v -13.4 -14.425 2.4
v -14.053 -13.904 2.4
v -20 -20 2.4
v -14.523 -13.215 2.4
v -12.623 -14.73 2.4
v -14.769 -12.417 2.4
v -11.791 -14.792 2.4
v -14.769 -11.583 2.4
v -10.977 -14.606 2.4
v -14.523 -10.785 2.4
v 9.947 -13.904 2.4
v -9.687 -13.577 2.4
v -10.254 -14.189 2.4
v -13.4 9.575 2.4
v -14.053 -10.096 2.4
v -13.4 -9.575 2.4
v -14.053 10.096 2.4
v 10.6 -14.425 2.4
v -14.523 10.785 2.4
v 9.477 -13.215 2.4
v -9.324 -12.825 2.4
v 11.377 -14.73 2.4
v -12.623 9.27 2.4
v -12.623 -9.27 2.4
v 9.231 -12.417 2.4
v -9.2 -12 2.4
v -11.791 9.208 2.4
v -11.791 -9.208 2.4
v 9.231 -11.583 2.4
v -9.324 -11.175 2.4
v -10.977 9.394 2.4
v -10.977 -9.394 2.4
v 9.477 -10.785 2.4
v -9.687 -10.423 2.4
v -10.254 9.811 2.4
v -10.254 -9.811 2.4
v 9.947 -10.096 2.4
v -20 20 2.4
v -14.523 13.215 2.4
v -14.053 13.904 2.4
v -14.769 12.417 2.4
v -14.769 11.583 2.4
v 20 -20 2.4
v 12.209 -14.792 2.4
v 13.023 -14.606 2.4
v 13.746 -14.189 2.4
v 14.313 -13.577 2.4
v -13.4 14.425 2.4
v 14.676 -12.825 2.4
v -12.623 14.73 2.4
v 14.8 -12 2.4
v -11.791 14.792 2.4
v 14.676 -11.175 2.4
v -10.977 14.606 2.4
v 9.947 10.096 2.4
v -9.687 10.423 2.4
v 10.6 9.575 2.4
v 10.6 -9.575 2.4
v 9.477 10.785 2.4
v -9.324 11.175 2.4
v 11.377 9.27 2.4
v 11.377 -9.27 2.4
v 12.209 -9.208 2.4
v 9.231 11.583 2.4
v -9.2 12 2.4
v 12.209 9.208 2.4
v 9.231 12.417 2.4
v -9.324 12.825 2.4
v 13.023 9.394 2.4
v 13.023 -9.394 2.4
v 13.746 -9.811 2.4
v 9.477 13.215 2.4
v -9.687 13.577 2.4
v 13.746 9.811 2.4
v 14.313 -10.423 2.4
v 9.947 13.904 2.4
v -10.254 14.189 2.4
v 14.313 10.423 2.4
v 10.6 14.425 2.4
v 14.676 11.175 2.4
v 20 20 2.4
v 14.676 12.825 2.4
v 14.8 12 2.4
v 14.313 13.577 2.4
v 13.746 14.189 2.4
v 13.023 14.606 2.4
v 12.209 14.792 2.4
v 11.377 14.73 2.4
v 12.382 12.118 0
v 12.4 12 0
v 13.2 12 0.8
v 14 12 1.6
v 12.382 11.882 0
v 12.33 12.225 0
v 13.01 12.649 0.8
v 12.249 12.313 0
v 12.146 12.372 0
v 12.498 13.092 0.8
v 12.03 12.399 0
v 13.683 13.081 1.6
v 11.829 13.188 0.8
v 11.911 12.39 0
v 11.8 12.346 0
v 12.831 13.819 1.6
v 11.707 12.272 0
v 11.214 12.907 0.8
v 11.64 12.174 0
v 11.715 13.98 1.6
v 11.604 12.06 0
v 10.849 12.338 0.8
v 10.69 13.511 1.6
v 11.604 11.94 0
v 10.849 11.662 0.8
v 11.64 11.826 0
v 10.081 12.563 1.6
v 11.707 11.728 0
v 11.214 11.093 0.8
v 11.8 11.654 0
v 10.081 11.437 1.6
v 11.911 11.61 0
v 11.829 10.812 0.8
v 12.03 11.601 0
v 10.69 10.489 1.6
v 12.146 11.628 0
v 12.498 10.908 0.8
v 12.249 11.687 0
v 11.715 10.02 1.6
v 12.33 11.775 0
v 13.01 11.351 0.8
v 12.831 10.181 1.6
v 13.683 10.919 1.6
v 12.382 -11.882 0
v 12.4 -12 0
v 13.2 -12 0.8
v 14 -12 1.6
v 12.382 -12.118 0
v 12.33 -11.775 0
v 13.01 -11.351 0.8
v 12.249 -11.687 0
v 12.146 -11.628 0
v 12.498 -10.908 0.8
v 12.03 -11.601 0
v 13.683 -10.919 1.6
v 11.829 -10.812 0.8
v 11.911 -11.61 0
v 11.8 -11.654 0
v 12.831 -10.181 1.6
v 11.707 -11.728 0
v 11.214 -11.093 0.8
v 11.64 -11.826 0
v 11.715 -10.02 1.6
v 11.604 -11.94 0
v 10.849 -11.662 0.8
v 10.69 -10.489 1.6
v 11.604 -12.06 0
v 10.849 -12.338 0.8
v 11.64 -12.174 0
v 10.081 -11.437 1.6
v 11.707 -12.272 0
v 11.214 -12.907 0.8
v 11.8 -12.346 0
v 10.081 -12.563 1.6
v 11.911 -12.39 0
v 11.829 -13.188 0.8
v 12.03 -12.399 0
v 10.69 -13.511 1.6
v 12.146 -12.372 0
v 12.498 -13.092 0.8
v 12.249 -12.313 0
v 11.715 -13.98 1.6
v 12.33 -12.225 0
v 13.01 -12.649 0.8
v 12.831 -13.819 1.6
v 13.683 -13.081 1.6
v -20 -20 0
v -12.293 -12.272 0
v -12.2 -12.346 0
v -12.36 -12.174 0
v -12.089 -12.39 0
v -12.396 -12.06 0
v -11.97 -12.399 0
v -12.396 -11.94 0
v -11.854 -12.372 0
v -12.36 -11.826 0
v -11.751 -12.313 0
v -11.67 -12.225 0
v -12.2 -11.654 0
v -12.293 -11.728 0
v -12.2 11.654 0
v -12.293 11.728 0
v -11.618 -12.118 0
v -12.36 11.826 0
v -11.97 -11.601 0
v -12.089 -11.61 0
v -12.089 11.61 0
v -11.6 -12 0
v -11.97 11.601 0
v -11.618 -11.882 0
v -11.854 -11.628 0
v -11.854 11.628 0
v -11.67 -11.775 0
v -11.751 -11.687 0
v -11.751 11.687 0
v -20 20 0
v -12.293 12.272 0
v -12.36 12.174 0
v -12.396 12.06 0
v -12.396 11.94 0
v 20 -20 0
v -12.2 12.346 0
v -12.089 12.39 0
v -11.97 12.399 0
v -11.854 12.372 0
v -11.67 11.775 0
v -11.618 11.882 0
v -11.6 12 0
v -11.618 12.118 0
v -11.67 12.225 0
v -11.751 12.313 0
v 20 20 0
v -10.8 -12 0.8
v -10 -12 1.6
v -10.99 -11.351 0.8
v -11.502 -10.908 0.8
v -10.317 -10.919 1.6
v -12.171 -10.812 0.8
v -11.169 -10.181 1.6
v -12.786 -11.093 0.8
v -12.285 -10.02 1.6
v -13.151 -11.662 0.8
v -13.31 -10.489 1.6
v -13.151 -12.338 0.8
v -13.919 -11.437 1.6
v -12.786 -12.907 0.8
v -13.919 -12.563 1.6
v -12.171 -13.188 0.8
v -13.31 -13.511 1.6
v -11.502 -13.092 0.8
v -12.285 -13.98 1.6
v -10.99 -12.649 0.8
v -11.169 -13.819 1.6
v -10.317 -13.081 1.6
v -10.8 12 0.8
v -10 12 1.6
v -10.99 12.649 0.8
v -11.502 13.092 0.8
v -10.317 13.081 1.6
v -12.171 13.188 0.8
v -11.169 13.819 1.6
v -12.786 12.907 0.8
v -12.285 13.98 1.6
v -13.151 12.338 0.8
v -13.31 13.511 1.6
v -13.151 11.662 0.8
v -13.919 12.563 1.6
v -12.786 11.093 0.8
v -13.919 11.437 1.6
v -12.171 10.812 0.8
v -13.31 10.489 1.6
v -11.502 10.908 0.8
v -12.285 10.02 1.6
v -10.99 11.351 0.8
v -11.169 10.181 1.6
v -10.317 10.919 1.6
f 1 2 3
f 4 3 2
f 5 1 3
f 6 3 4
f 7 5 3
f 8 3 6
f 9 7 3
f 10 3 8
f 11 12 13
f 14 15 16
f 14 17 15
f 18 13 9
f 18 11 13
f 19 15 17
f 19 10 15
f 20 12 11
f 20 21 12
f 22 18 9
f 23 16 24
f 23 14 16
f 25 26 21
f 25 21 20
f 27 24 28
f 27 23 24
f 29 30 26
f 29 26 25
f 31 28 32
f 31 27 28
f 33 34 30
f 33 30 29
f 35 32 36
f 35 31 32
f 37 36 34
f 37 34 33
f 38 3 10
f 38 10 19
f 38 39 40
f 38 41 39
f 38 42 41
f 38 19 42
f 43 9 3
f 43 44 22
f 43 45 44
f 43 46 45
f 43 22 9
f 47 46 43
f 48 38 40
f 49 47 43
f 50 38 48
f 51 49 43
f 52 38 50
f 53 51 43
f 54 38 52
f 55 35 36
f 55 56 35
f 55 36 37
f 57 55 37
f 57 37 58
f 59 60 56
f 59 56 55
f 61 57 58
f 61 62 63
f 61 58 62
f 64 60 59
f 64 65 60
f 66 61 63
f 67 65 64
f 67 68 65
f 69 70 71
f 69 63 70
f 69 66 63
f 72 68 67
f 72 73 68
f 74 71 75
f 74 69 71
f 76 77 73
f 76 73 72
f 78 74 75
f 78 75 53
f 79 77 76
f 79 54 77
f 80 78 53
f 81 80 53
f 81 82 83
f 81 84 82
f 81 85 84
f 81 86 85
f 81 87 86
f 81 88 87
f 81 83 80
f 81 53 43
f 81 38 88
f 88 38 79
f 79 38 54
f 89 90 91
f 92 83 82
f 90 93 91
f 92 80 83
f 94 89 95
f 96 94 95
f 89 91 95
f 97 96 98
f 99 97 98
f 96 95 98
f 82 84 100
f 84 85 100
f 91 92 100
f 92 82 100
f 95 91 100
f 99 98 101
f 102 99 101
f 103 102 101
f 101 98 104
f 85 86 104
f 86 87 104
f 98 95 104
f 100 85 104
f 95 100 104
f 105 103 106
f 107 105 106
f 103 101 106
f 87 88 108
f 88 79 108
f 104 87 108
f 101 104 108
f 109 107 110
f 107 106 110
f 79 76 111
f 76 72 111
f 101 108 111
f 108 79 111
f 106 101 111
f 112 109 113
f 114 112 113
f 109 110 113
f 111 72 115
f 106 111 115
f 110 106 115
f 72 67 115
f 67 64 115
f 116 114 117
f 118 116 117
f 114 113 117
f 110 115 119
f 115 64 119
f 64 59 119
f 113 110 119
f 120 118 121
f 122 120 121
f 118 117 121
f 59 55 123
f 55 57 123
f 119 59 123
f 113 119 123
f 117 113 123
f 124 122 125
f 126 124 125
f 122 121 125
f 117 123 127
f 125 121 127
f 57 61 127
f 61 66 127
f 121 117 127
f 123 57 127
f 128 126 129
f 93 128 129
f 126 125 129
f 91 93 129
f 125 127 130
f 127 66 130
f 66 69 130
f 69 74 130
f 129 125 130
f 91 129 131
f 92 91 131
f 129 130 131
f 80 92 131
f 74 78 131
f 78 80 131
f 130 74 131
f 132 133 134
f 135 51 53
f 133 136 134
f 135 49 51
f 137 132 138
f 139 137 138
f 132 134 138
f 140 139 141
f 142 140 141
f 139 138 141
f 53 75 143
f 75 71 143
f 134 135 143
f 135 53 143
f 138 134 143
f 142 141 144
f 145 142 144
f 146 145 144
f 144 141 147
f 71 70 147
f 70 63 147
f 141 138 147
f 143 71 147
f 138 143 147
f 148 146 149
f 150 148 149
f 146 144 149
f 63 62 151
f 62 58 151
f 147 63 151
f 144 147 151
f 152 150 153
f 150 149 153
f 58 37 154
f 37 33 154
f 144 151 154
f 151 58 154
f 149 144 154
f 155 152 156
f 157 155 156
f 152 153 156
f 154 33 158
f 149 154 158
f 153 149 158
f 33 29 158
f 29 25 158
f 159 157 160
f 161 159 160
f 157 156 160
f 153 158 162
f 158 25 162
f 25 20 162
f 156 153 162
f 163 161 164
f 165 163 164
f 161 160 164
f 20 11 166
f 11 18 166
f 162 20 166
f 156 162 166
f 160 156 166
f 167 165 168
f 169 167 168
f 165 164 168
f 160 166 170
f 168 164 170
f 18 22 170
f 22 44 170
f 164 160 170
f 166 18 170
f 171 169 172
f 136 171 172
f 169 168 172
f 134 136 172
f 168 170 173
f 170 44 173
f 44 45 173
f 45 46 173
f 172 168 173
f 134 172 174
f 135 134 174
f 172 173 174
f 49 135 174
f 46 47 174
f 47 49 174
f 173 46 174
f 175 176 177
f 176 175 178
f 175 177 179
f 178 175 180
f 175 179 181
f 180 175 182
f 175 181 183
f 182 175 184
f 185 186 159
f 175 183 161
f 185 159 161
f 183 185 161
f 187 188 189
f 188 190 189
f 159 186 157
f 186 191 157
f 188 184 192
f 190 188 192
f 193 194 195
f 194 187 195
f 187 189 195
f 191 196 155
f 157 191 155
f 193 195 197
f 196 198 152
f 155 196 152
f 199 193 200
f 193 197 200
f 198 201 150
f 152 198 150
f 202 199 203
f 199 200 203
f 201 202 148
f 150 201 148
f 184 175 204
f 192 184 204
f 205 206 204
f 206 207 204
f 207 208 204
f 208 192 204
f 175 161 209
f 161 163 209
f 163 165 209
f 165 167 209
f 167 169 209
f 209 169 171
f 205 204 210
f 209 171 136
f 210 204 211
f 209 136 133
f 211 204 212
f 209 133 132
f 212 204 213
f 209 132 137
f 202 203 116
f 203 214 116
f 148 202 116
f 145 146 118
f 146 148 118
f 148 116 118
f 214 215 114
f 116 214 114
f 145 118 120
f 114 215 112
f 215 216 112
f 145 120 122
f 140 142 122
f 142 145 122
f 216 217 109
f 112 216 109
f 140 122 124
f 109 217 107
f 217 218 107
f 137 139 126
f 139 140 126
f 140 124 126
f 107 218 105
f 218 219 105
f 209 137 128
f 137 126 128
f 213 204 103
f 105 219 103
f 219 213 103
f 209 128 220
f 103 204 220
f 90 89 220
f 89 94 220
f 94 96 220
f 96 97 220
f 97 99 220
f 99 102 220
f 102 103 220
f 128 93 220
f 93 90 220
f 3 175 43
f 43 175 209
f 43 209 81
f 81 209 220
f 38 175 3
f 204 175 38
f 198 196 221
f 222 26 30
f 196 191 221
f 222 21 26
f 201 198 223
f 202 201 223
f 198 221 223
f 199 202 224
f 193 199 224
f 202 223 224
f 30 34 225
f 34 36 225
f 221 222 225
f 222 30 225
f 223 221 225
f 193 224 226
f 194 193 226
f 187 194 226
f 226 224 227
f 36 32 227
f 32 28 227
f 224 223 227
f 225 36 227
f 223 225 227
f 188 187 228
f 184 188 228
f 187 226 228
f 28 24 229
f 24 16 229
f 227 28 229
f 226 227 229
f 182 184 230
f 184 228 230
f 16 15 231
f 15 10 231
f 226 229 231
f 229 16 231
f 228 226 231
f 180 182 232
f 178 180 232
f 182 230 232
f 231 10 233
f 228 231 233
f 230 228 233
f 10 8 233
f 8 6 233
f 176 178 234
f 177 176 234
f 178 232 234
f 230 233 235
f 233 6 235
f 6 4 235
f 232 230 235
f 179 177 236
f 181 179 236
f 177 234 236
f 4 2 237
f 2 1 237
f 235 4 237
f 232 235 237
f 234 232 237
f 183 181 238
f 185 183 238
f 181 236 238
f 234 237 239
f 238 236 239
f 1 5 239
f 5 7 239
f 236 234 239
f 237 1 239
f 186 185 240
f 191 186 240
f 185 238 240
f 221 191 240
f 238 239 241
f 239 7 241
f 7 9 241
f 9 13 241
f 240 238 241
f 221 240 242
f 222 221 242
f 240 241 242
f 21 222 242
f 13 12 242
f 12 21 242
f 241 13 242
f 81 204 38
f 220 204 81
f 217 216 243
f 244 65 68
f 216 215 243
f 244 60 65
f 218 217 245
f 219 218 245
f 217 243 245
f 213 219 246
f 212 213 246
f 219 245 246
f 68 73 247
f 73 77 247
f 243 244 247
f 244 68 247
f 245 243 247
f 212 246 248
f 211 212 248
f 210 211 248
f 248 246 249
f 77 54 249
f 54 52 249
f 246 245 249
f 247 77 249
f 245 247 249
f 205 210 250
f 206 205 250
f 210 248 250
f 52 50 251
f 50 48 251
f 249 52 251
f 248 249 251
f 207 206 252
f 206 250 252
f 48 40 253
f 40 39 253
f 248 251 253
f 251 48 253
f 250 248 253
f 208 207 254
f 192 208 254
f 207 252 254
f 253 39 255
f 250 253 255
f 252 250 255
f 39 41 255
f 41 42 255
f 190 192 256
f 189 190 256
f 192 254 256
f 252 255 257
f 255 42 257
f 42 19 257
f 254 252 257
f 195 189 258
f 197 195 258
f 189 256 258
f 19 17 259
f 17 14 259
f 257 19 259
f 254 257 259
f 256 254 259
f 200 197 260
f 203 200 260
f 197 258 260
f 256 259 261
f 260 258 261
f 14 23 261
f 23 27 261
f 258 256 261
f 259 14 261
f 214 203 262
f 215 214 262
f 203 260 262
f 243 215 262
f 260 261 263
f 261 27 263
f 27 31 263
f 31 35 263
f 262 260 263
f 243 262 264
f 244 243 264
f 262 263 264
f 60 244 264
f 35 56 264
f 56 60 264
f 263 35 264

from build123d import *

# Parameters (mm, degrees)
F0_W     = 40
F0_H     = 40
F0_R     = 0.3
F1_DEPTH = 2.4


# Not quite as in the source:
# - a fillet or chamfer that OpenCascade refuses, or shapes differently, is made with other operations: its cross-section is extruded or revolved along the edge and cut away or added


with BuildPart() as f1:
    # F0 (on Top) → F1 (new body)
    with BuildSketch(Plane.XY):
        Rectangle(F0_W, F0_H)
        with Locations((-12, -12)):
            Circle(F0_R, mode=Mode.SUBTRACT)
        with Locations((12, -12)):
            Circle(F0_R, mode=Mode.SUBTRACT)
        with Locations((-12, 12)):
            Circle(F0_R, mode=Mode.SUBTRACT)
        with Locations((12, 12)):
            Circle(F0_R, mode=Mode.SUBTRACT)
    extrude(amount=F1_DEPTH)

    # F2: chamfer of 2.5 on 4 edges, made by hand

    # F2_s1 → F2_t2 (revolve, cut)
    with BuildSketch(Plane.XZ.offset(-12)):
        Polygon((-11.7, -0.1), (-9.2, 2.4), (-11.7, 2.4), align=None)
    revolve(axis=Axis((-12, 12, 2.4), (0, 0, 1)), mode=Mode.SUBTRACT)

    # F2_s3 → F2_t4 (revolve, cut)
    with BuildSketch(Plane.XZ.offset(-12)):
        Polygon((12.3, -0.1), (14.8, 2.4), (12.3, 2.4), align=None)
    revolve(axis=Axis((12, 12, 2.4), (0, 0, 1)), mode=Mode.SUBTRACT)

    # F2_s5 → F2_t6 (revolve, cut)
    with BuildSketch(Plane.XZ.offset(12)):
        Polygon((12.3, -0.1), (14.8, 2.4), (12.3, 2.4), align=None)
    revolve(axis=Axis((12, -12, 2.4), (0, 0, 1)), mode=Mode.SUBTRACT)

    # F2_s7 → F2_t8 (revolve, cut)
    with BuildSketch(Plane.XZ.offset(12)):
        Polygon((-11.7, -0.1), (-9.2, 2.4), (-11.7, 2.4), align=None)
    revolve(axis=Axis((-12, -12, 2.4), (0, 0, 1)), mode=Mode.SUBTRACT)


solid = f1.part
